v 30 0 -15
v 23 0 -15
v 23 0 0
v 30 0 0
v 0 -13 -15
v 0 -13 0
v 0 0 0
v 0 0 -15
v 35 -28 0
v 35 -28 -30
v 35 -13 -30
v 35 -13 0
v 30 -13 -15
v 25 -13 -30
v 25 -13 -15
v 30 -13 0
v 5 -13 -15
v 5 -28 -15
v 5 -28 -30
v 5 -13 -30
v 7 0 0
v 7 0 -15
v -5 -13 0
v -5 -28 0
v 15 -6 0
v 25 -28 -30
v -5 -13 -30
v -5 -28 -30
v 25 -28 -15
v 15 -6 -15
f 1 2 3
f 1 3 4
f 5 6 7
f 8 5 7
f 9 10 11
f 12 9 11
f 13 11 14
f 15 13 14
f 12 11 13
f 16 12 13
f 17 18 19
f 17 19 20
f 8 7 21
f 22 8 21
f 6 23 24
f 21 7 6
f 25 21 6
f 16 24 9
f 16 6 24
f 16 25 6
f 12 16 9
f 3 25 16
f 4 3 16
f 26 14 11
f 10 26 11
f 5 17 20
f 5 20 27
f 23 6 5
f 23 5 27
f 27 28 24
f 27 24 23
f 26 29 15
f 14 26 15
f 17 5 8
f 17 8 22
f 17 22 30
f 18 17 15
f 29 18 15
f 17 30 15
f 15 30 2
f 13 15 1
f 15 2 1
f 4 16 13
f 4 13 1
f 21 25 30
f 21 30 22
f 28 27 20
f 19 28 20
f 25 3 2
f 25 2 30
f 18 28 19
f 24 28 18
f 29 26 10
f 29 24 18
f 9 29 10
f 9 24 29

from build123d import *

# Parameters (mm, degrees)
SKETCH1_W           = 30
SKETCH1_H           = 28
BOSS_EXTRUDE1_DEPTH = 15
CUT_EXTRUDE4_DEPTH  = 44.69210455
SKETCH3_W           = 5
SKETCH3_H           = 15
EXTRUDE_3_DEPTH     = 30


with BuildPart() as part:
    # Sketch1 → Boss-Extrude1 (new body)
    with BuildSketch(Plane.XY):
        with Locations((15, -14)):
            Rectangle(SKETCH1_W, SKETCH1_H)
    extrude(amount=-BOSS_EXTRUDE1_DEPTH)

    # Sketch2 → Cut-Extrude4 (cut, through all)
    with BuildSketch(Plane.XY):
        Polygon((23, 0), (15, -6), (7, 0), align=None)
    extrude(amount=-CUT_EXTRUDE4_DEPTH, mode=Mode.SUBTRACT)

    # Sketch3 → 凸台-拉伸3 (add)
    with BuildSketch(Plane.XY):
        with Locations((-2.5, -20.5)):
            Rectangle(SKETCH3_W, SKETCH3_H)
        with Locations((2.5, -20.5)):
            Rectangle(SKETCH3_W, SKETCH3_H)
        with Locations((27.5, -20.5)):
            Rectangle(SKETCH3_W, SKETCH3_H)
        with Locations((32.5, -20.5)):
            Rectangle(SKETCH3_W, SKETCH3_H)
    extrude(amount=-EXTRUDE_3_DEPTH)


solid = part.part
